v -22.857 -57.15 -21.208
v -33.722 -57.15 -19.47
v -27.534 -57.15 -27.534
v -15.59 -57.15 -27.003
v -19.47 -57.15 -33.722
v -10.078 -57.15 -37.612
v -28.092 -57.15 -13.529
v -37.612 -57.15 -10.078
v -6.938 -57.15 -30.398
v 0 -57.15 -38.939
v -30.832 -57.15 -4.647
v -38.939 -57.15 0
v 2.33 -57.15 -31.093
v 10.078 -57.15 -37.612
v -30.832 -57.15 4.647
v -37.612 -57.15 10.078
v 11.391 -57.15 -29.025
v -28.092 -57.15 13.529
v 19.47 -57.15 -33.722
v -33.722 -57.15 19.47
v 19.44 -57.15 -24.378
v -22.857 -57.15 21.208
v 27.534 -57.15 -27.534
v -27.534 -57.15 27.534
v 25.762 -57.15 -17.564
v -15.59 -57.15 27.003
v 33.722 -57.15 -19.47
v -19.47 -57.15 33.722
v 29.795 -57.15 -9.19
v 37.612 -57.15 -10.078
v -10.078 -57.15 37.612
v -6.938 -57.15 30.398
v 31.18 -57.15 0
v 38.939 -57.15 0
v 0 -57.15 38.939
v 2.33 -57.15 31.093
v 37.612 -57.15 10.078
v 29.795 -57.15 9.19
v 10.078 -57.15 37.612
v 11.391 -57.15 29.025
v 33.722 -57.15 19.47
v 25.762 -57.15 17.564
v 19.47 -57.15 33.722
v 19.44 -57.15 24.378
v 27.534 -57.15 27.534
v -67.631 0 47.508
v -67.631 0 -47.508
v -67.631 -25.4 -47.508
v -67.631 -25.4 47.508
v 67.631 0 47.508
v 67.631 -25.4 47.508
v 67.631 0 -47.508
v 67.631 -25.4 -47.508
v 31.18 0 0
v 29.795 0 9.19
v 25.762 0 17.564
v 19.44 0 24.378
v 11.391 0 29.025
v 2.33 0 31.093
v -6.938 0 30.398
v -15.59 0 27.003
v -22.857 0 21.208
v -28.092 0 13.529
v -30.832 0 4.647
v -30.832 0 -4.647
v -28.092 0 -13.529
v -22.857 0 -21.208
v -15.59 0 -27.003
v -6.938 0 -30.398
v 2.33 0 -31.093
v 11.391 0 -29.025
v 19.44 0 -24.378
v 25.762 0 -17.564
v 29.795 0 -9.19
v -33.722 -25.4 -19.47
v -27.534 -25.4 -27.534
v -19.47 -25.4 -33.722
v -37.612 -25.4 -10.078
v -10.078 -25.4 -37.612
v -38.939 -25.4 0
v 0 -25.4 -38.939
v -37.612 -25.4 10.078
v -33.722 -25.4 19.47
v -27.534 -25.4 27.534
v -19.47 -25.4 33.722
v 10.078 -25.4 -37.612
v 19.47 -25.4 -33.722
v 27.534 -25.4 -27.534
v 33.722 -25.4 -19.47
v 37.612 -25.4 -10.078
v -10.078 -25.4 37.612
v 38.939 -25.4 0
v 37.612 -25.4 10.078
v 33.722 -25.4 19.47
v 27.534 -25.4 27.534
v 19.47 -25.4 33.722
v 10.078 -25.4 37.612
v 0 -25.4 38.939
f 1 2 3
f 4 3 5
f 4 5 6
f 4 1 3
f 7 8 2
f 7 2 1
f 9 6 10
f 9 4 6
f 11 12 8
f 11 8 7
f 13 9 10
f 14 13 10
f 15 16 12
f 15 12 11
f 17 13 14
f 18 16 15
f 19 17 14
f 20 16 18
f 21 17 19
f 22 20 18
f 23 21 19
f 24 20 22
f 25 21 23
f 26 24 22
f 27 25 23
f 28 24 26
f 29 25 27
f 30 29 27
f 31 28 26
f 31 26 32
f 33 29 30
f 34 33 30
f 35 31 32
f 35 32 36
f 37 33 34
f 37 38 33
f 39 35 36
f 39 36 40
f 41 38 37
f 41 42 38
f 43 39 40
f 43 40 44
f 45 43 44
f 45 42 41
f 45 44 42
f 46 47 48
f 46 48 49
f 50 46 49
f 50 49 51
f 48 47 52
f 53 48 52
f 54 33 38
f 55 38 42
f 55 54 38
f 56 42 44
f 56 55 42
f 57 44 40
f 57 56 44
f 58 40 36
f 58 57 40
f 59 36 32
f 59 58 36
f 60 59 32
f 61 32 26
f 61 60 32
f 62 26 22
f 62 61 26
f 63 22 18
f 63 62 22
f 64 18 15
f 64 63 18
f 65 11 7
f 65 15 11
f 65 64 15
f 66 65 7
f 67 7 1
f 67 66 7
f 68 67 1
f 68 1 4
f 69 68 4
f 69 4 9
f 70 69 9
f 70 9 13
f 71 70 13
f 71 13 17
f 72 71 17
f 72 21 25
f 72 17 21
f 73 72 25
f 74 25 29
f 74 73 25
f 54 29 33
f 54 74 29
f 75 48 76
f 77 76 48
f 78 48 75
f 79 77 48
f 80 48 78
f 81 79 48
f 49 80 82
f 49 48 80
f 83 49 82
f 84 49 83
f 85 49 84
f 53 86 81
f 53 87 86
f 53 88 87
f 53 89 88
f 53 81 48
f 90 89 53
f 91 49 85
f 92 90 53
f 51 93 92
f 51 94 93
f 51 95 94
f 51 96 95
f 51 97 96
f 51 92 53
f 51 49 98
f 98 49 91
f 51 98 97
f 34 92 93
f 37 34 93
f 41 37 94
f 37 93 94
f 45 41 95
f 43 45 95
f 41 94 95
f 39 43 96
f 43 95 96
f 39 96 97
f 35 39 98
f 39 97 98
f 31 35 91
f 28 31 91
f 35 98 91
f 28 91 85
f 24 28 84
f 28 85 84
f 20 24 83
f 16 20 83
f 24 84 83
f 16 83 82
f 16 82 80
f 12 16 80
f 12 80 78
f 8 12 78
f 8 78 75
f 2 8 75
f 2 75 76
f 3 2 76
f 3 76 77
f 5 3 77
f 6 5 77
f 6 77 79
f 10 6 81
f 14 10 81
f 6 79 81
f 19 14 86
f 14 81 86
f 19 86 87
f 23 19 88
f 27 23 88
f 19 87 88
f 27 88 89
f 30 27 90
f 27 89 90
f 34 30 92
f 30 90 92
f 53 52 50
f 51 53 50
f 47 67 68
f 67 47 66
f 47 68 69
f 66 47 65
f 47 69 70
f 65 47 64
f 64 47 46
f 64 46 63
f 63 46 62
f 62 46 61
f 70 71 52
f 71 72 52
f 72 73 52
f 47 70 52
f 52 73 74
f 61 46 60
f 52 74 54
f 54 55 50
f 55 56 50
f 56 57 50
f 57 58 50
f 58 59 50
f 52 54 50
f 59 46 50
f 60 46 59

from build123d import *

# Parameters (mm, degrees)
F0_W     = 135.262012
F0_H     = 95.015392
F1_DEPTH = 25.4
F2_R     = 38.939289
F3_DEPTH = 31.75
F4_R     = 31.180051
F5_DEPTH = 76.2


with BuildPart() as f1:
    # F0 (on Front) → F1 (new body)
    with BuildSketch(Plane.XZ):
        Rectangle(F0_W, F0_H)
    extrude(amount=F1_DEPTH)

    # F2 (on face) → F3 (join)
    with BuildSketch(Plane.XZ.offset(25.4)):
        Circle(F2_R)
    extrude(amount=F3_DEPTH)

    # F4 (on Front) → F5 (cut)
    with BuildSketch(Plane.XZ):
        Circle(F4_R)
    extrude(amount=F5_DEPTH, mode=Mode.SUBTRACT)


solid = f1.part
